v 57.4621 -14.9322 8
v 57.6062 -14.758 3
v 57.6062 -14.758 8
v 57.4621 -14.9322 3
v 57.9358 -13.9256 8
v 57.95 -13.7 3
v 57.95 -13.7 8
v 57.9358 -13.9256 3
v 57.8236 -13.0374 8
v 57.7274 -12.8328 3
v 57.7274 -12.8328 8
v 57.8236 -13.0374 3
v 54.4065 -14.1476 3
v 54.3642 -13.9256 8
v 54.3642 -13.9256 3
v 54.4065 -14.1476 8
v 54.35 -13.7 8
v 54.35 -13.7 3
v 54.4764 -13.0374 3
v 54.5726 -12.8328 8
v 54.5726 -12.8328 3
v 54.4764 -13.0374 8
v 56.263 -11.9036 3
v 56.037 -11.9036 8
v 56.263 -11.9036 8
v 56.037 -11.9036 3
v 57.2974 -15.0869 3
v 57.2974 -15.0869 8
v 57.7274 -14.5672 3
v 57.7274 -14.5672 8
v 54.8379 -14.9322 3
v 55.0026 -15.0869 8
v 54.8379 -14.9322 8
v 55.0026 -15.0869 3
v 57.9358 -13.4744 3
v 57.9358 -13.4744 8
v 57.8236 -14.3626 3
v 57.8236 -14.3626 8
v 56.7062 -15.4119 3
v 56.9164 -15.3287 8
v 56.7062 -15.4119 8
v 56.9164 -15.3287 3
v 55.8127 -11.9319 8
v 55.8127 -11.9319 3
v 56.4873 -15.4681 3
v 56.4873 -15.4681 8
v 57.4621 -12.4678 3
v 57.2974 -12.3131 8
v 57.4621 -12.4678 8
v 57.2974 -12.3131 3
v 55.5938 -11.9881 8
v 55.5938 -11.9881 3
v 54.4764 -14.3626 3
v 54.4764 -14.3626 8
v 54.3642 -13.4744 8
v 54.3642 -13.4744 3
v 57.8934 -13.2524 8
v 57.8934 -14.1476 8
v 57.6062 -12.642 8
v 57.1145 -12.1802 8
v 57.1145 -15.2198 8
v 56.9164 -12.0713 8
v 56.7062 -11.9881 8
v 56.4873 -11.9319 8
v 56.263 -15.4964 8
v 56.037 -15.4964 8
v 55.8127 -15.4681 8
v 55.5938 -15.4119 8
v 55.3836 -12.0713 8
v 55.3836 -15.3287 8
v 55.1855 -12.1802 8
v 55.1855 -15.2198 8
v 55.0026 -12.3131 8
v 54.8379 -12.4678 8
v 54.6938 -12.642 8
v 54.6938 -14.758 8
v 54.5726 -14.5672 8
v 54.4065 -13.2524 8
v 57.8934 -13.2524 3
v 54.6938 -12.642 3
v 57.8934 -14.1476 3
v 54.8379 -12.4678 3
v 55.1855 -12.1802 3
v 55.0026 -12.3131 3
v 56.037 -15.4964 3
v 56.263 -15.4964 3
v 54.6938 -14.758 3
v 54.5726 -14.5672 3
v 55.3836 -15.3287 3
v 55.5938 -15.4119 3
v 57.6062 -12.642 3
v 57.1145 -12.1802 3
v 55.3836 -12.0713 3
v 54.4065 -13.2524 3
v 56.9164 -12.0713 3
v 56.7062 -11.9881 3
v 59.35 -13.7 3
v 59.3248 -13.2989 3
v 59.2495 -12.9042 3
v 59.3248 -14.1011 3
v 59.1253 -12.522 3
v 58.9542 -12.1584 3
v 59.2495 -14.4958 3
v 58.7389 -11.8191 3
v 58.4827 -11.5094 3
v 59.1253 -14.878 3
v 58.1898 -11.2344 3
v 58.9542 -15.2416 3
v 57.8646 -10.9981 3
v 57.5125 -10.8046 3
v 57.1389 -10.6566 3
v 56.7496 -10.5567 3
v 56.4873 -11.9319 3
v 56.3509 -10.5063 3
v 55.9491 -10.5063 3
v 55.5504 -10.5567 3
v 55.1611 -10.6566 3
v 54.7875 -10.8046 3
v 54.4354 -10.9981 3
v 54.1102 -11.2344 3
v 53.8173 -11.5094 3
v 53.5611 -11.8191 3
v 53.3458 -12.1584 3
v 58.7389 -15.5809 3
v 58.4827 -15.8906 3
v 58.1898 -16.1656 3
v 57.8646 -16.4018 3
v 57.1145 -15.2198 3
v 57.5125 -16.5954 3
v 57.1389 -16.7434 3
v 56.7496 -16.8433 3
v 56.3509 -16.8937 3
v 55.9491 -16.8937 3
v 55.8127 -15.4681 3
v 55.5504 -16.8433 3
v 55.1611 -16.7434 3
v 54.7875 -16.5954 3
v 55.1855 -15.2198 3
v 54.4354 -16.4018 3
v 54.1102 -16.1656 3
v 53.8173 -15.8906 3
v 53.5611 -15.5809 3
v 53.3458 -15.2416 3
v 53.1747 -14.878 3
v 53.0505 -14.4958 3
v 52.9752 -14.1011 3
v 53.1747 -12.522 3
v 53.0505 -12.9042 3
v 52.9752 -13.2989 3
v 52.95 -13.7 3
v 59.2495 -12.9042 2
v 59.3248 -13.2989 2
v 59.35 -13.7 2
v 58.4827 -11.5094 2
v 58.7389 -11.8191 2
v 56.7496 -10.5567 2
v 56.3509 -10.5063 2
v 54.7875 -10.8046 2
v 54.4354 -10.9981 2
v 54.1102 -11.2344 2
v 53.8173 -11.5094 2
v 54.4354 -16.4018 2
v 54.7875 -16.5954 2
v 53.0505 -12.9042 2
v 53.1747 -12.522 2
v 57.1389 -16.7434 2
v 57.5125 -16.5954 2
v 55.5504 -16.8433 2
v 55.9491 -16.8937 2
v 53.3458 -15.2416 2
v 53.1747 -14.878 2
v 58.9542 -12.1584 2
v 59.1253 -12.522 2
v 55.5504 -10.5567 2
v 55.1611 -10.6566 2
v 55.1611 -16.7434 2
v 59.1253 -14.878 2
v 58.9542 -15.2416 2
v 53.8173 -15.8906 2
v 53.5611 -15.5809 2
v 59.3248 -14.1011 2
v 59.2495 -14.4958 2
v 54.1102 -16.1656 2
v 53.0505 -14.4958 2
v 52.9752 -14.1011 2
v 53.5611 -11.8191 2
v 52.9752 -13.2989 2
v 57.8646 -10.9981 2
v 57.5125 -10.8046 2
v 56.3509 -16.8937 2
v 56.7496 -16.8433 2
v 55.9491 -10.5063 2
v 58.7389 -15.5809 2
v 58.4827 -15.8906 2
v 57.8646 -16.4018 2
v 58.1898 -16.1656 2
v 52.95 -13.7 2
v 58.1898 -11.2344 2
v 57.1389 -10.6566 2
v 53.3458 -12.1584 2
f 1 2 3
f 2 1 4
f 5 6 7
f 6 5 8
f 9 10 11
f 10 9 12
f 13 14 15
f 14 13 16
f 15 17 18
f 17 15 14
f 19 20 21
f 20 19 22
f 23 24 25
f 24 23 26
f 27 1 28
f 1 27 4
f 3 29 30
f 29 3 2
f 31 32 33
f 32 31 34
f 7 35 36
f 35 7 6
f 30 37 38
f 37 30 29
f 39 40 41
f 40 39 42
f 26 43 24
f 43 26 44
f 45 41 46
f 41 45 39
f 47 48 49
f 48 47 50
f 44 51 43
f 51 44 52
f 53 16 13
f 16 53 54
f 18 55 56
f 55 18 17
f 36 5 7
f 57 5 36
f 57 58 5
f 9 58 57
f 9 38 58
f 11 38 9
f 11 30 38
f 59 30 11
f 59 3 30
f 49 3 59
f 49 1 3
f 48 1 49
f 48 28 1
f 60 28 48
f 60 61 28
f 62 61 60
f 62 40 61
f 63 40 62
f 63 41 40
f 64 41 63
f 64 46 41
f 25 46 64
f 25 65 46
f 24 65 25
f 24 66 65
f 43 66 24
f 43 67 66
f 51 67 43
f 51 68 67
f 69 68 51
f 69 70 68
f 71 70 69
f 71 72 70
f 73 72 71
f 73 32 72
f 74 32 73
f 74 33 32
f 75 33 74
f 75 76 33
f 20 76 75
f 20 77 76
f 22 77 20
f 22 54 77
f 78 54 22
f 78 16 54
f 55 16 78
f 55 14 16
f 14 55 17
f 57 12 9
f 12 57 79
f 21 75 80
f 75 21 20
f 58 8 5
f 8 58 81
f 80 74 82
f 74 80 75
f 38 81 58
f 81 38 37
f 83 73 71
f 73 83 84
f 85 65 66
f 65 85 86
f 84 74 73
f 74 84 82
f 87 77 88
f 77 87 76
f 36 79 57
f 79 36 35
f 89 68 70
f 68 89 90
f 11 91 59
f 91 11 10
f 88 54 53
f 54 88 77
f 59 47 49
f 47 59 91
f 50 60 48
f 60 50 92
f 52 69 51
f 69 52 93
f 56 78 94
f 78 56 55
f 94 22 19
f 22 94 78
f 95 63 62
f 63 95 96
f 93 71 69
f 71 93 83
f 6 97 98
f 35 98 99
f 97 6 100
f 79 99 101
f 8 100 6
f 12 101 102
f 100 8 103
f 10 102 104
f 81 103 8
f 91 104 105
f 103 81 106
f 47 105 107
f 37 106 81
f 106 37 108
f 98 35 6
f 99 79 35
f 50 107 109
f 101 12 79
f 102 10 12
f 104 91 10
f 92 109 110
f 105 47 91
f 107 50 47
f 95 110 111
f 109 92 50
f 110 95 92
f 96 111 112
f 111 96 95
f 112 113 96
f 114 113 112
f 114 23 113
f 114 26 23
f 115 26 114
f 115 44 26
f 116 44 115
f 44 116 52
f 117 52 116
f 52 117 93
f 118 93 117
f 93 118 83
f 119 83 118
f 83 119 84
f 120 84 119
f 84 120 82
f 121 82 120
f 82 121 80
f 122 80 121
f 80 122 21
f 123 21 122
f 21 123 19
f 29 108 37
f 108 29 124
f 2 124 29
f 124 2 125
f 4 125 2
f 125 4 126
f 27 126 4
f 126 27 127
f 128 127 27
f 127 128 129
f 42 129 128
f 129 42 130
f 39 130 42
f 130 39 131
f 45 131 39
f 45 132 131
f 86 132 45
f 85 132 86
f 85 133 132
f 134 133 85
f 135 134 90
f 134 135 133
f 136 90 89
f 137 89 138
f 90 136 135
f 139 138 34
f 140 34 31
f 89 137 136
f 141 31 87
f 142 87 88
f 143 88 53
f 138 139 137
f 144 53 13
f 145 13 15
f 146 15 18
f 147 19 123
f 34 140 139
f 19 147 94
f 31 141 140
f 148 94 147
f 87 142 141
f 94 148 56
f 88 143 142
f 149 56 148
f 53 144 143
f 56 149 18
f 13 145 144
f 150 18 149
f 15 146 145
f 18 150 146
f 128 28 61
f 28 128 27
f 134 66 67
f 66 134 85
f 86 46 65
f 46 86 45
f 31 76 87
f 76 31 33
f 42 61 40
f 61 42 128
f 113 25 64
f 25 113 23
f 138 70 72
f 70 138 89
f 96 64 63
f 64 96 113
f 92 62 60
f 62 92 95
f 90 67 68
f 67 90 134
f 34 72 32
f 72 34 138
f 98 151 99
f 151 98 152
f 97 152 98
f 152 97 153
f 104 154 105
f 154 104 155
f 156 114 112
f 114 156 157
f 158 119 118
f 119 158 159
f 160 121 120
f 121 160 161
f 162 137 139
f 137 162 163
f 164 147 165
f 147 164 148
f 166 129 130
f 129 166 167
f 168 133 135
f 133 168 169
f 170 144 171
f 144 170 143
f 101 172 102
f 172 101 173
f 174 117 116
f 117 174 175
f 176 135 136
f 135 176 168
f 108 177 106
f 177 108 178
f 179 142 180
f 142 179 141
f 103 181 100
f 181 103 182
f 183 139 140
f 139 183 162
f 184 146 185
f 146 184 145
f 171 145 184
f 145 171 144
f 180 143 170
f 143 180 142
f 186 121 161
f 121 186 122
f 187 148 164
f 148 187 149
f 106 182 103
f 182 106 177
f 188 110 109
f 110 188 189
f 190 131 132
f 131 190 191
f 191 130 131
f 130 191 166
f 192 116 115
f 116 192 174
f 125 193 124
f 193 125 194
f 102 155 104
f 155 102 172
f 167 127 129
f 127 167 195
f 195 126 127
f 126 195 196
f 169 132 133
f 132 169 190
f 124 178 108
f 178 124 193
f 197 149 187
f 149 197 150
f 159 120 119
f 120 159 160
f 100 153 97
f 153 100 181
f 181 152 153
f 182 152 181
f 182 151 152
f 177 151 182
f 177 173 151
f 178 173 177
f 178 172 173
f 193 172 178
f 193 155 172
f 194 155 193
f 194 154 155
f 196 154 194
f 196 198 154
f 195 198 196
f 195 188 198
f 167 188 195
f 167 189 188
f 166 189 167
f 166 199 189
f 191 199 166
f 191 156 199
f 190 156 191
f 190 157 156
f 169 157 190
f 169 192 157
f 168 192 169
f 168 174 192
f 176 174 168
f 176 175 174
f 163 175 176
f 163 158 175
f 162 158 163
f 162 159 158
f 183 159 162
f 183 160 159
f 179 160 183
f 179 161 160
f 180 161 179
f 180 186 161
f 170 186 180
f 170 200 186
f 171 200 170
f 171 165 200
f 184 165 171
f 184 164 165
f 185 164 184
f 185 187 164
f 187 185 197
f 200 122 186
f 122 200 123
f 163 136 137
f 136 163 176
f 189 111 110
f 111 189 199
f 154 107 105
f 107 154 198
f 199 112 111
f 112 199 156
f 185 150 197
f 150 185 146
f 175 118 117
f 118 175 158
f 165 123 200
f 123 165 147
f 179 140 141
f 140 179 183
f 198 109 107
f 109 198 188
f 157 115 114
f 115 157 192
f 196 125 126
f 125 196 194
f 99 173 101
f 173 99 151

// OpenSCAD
// file: body_thin.scad
/**
 * [x] add screws islands
 * [x] add cover panel
 * [x] design cover for shield
 * [x] mark buttons positions
 * create a travel case
 * move battery location to the side
 * move sheld to the bottom
 * optimize the globalMove usage
 */

//hull() {
$fn = 50;
magnet_radius = 4 / 2 + 0.1;
globalMove = [-209.55, -99.5, 0];

holePosition1 = [161.15, 94.95, 0];
holePosition2 = [161.1, 113.9, 0];
holePosition3 = [237.1, 117.4, 0];
holePosition4 = [250.87, 70.05, 0];
wallThickness = 1.2;

sensorRadius = 20;
sensolPosition = [67, 13, 0];

module bottom_panel(hide_side_magnets = false) {
  translate([-0, -0, 10.5]) {
    //translate([0, 0, 13]) {
    rotate([-3, 1, 0]) {
      translate([-20, 0, -12.8]) {
        cube([300, 200, 15], center=true);
      }

      translate([0, 0, 0]) {
        legs();
      }

      magnets2(hide_side_magnets1=hide_side_magnets);

      scale([1, -1, 1]) {
        magnets2(hide_side_magnets1=hide_side_magnets);
      }
    }
    //}
  }
}

module magnets2(hide_side_magnets1 = false) {
  leg1 = [64.4, -21.0, 15];
  translate(leg1)
    cylinder(h=40, r=magnet_radius, $fn=50, center=true);

  if (!hide_side_magnets1) {
    rotate([0, 0, 180])
      translate(leg1)
        cylinder(h=40, r=magnet_radius, $fn=50, center=true);
  }
  translate([0, -22, 15])
    cylinder(h=40, r=magnet_radius, $fn=50, center=true);
}

module battery() {
  cube([25, 43, 5]);
}

module legs() {
  legmove1 = [43, 21.0, 0];
  //legmove2 = [43, 11.0, 0];
  translate([0, 0, -5.0]) {

    translate([75, 15, 0]) {
      leg();
    }

    translate(legmove1) {
      leg3();
    }

    scale([-1, 1, 1]) {
      translate(legmove1) {
        leg3();
      }
    }

    scale([-1, -1, 1]) {
      translate(legmove1) {
        leg3();
      }
    }

    scale([1, -1, 1]) {
      translate(legmove1) {
        leg3();
      }
    }

    //    scale([1, -1, 1]) {
    //  translate(legmove2) {
    //    leg();
    //  }
    //}
    //translate([102, 14.5, 0]) {
    //  leg();
    //}
  }

  module leg3() {
    leg();

    translate([0, 10, 0]) {
      leg();
    }

    translate([0, -10, 0]) {
      leg();
    }

    translate([0, 20, 0]) {
      leg();
    }
  }

  /*
  translate([-64, -25, -7.5]) {

    rotate([0, 0, -40]) {
      translate([2, -7, 0]) {
        leg();
      }
      translate([2, 2, 0]) {
        leg();
      }
    }

    translate([102, 5.5, 0]) {
      leg();
    }
    translate([102, 14.5, 0]) {
      leg();
    }

    translate([-5, 56, 0]) {
      leg();
    }
    translate([-5, 46, 0]) {
      leg();
    }

    translate([102, 46, 0]) {
      leg();
    }
    translate([102, 55, 0]) {
      leg();
    }
  } */
}

module leg() {
  cube([20, 3.5, 1], center=true);
  /*
  linear_extrude(2, center=true) {
    hull() {
      circle(4);

      translate([14, 0, 0]) {
        circle(4);
      }
    }
  }
  */
}

module stand() {
  difference() {
    union() {
      cylinder(h=4, r=1.8);
      cylinder(h=3, r1=4.5, r2=4);
    }
    cylinder(h=5, r=1);
  }
}

module pcb() {
  translate([0, 0, 12.5]) {
    translate(globalMove) {
      linear_extrude(1.5) {
        import("outline.svg");
      }
    }
  }
}

module bodyProjection() {
  import("outline.svg");

  translate(-globalMove) {
    translate(sensolPosition) {
      circle(r=sensorRadius - wallThickness / 2, $fn=50);
    }
  }
}

module body() {

  difference() {
    translate(globalMove) {
      union() {

        difference() {
          linear_extrude(15.5) {
            minkowski() {
              bodyProjection();
              circle(wallThickness);
            }
          }

          translate([0, 0, 9]) {
            linear_extrude(10) {
              minkowski() {
                bodyProjection();
                circle(0.3);
              }
            }
          }

          //translate([3, 0, 6]) {
          //  battery();
          //}

          translate([6, 270, 13])
            cube([8, 30, 10]);
        }

        linear_extrude(11.5) {
          minkowski() {
            import("outline_empty.svg");
            circle(0.3);
          }
        }
      }
    }

    bottom_panel();

    // power slider cutout
    translate([77.2, -15, 17]) {
      cube([30, 8, 8], center=true);
      translate([-10, 0, 0]) {
        rotate([0, -90, 0]) {
          rotate([0, 0, 45]) {
            cylinder(h=3, r1=9, r2=1, center=true, $fn=4);
          }
        }
      }
    }
  }

  translate([0, 0, 8.5]) {
    translate(globalMove) {
      stands();
    }
  }

  // control helpers
  if (false) {
    translate(globalMove) {
      linear_extrude(height=30) {
        import("controls.svg");
      }
    }
  }
}

//translate([0, 230, 7])
//  cube([3, 3, 3]);

//bottom_panel();

//difference() {

//bodyoutline();

//translate([-119.4, 0, 0]) {
//  cube([100, 100, 100], center=true);
//}

//translate([50,150,-10]) {
//  cube([100,100,100]);
//}
//}

module holesInPanel() {
  holeRadius = 1;

  translate([0, 0, 0]) {
    //linear_extrude(10) {
    //import("holes.svg");
    //}

    translate(holePosition1)
      cylinder(r=holeRadius, h=10, center=true);

    translate(holePosition2)
      cylinder(r=holeRadius, h=10, center=true);

    translate(holePosition3)
      cylinder(r=holeRadius, h=10, center=true);

    translate(holePosition4)
      cylinder(r=holeRadius, h=10, center=true);
  }
}

module stands() {
  holeRadius = 1;

  translate(holePosition1)
    stand();

  translate(holePosition2)
    stand();

  translate(holePosition3)
    stand();

  translate(holePosition4)
    stand();
}

module panel() {

  translate([0, 0, 14]) {
    translate(globalMove) {
      // holesInPanel();
      difference() {

        linear_extrude(1.5) {
          //minkowski() {
          import("outline.svg");
          //circle(0.1);
          //}
        }

        translate([0, 0, -5])
          linear_extrude(10) {
            import("buttons.svg");
          }

        holesInPanel();

        translate([268.4, 95, 0]) {
          difference() {
            cube([25, 90, 40], center=true);
            translate([-10, -60, 0]) {
              rotate([0, 0, 60]) {
                cube([80, 80, 50], center=true);
              }
            }
          }
        }
      }
    }
  }
}

//translate([0, 0, 15]) {
//  cover();
//}

//panelbuttons(fullheight=false);

//outline();

//cover();

if (false) {
  panel();
}
//holesInPanel();

//difference() {
if (true) {
  union() {
    body();
    //pcb();
  }
}

//translate([-100,0,0])
//inspection cube
//cube([100, 100, 100], center=true);

//}

// bodyProjection();

//linear_extrude(12) {
//minkowski() {
//import("outline_empty_sp.svg");
//circle(0.3);
//}
//        }
// main file
use <body_thin.scad>

/**
 * TODO
 * - [x] sensor plate
 *.- reset button
 *.- [x] complete the perimeter
 * - figure out how to fix cover to the body 
 *
 */
$fn = 50;
cube1Rotation = [-15, 0, -30];
cube1Offset = [32, -127.5, 0];

globalMove = [-209.55, -99.5, 0];
sensorRadius = 20;
sensolPosition = [67, 13, 0];
wallThickness = 1.2;

resetButtonPosition = [56.15, -13.7, 0];
resetButtonRadius = 2;

module bodyProjection() {
  import("outline.svg");

  translate(-globalMove) {
    translate(sensolPosition) {
      circle(r=sensorRadius - wallThickness / 2, $fn=50);
    }
  }
}

module cuttingcubes() {
  translate([-56.6, 0, 0]) {
    rotate([0, 10, 0]) {
      cube([200, 200, 200], center=true);
    }
  }

  translate(cube1Offset) {
    rotate(cube1Rotation) {
      cube([200, 200, 200], center=true);
    }
  }
}

module cover() {

  globalMove = [-209.55, -99.5, 0];
  wallThickness = 1.2;

  difference() {
    translate(globalMove) {
      difference() {

        union() {
          linear_extrude(8) {
            minkowski() {
              bodyProjection();
              circle(wallThickness);
            }
          }

          linear_extrude(9.4) {
            translate(-globalMove) {
              translate(sensolPosition) {
                circle(r=sensorRadius + wallThickness / 2, $fn=50);
              }
            }
          }
        }

        union() {
          translate([0, 0, -1]) {
            linear_extrude(8) {
              minkowski() {
                bodyProjection();
                circle(0.3);
              }
            }
          }
        }
      }
    }
    cuttingcubes();

    // sensor cutout
    translate([0, 0, 8.5]) {
      translate(sensolPosition) {
        linear_extrude(5) {
          circle(r=sensorRadius + 0.1, $fn=50);
        }
      }
    }

    // sensor cutout vertical
    translate([0, 0, 6]) {
      translate(sensolPosition) {
        linear_extrude(10) {
          circle(r=sensorRadius - 2, $fn=50);
        }
      }
    }

    // reset button cutout
    translate([0, 0, 6]) {
      translate(resetButtonPosition) {
        linear_extrude(10) {
          circle(r=resetButtonRadius, $fn=50);
        }
      }
    }

    //translate([-58, 20, 5]) {
    //  cube([12, 40, 11], center=true);
    //}
  }

  // reset button walls
  translate([0, 0, 3]) {
    translate(resetButtonPosition) {
      linear_extrude(4) {

        difference() {
          circle(r=resetButtonRadius + wallThickness, $fn=50);
          circle(r=resetButtonRadius, $fn=50);
        }
      }
    }
  }

  //cuttingcubes();

  //translate([-68, -5, -1]) {
  //cube([12, 5, 11], center=true);
  //}

  intersection() {
    difference() {
      translate([0, 0, -1]) {
        translate(globalMove) {
          difference() {
            linear_extrude(8) {
              minkowski() {
                import("outline.svg");
                circle(wallThickness);
              }
            }
          }
        }
      }
      cuttingcubes();
    }
    translate([0, 1, 0]) {
      translate(cube1Offset) {
        rotate(cube1Rotation) {
          cube([200, 200, 200], center=true);
        }
      }
    }
  }
}

if (false) {
  cover();
}

if (true) {
  // reset button
  translate([0, 0, 3]) {
    translate(resetButtonPosition) {
      linear_extrude(5) {
        circle(r=resetButtonRadius - 0.2, $fn=50);
      }
    }
  }

  translate([0, 0, 2]) {
    translate(resetButtonPosition) {
      linear_extrude(1) {
        circle(r=resetButtonRadius + wallThickness, $fn=50);
      }
    }
  }
}
